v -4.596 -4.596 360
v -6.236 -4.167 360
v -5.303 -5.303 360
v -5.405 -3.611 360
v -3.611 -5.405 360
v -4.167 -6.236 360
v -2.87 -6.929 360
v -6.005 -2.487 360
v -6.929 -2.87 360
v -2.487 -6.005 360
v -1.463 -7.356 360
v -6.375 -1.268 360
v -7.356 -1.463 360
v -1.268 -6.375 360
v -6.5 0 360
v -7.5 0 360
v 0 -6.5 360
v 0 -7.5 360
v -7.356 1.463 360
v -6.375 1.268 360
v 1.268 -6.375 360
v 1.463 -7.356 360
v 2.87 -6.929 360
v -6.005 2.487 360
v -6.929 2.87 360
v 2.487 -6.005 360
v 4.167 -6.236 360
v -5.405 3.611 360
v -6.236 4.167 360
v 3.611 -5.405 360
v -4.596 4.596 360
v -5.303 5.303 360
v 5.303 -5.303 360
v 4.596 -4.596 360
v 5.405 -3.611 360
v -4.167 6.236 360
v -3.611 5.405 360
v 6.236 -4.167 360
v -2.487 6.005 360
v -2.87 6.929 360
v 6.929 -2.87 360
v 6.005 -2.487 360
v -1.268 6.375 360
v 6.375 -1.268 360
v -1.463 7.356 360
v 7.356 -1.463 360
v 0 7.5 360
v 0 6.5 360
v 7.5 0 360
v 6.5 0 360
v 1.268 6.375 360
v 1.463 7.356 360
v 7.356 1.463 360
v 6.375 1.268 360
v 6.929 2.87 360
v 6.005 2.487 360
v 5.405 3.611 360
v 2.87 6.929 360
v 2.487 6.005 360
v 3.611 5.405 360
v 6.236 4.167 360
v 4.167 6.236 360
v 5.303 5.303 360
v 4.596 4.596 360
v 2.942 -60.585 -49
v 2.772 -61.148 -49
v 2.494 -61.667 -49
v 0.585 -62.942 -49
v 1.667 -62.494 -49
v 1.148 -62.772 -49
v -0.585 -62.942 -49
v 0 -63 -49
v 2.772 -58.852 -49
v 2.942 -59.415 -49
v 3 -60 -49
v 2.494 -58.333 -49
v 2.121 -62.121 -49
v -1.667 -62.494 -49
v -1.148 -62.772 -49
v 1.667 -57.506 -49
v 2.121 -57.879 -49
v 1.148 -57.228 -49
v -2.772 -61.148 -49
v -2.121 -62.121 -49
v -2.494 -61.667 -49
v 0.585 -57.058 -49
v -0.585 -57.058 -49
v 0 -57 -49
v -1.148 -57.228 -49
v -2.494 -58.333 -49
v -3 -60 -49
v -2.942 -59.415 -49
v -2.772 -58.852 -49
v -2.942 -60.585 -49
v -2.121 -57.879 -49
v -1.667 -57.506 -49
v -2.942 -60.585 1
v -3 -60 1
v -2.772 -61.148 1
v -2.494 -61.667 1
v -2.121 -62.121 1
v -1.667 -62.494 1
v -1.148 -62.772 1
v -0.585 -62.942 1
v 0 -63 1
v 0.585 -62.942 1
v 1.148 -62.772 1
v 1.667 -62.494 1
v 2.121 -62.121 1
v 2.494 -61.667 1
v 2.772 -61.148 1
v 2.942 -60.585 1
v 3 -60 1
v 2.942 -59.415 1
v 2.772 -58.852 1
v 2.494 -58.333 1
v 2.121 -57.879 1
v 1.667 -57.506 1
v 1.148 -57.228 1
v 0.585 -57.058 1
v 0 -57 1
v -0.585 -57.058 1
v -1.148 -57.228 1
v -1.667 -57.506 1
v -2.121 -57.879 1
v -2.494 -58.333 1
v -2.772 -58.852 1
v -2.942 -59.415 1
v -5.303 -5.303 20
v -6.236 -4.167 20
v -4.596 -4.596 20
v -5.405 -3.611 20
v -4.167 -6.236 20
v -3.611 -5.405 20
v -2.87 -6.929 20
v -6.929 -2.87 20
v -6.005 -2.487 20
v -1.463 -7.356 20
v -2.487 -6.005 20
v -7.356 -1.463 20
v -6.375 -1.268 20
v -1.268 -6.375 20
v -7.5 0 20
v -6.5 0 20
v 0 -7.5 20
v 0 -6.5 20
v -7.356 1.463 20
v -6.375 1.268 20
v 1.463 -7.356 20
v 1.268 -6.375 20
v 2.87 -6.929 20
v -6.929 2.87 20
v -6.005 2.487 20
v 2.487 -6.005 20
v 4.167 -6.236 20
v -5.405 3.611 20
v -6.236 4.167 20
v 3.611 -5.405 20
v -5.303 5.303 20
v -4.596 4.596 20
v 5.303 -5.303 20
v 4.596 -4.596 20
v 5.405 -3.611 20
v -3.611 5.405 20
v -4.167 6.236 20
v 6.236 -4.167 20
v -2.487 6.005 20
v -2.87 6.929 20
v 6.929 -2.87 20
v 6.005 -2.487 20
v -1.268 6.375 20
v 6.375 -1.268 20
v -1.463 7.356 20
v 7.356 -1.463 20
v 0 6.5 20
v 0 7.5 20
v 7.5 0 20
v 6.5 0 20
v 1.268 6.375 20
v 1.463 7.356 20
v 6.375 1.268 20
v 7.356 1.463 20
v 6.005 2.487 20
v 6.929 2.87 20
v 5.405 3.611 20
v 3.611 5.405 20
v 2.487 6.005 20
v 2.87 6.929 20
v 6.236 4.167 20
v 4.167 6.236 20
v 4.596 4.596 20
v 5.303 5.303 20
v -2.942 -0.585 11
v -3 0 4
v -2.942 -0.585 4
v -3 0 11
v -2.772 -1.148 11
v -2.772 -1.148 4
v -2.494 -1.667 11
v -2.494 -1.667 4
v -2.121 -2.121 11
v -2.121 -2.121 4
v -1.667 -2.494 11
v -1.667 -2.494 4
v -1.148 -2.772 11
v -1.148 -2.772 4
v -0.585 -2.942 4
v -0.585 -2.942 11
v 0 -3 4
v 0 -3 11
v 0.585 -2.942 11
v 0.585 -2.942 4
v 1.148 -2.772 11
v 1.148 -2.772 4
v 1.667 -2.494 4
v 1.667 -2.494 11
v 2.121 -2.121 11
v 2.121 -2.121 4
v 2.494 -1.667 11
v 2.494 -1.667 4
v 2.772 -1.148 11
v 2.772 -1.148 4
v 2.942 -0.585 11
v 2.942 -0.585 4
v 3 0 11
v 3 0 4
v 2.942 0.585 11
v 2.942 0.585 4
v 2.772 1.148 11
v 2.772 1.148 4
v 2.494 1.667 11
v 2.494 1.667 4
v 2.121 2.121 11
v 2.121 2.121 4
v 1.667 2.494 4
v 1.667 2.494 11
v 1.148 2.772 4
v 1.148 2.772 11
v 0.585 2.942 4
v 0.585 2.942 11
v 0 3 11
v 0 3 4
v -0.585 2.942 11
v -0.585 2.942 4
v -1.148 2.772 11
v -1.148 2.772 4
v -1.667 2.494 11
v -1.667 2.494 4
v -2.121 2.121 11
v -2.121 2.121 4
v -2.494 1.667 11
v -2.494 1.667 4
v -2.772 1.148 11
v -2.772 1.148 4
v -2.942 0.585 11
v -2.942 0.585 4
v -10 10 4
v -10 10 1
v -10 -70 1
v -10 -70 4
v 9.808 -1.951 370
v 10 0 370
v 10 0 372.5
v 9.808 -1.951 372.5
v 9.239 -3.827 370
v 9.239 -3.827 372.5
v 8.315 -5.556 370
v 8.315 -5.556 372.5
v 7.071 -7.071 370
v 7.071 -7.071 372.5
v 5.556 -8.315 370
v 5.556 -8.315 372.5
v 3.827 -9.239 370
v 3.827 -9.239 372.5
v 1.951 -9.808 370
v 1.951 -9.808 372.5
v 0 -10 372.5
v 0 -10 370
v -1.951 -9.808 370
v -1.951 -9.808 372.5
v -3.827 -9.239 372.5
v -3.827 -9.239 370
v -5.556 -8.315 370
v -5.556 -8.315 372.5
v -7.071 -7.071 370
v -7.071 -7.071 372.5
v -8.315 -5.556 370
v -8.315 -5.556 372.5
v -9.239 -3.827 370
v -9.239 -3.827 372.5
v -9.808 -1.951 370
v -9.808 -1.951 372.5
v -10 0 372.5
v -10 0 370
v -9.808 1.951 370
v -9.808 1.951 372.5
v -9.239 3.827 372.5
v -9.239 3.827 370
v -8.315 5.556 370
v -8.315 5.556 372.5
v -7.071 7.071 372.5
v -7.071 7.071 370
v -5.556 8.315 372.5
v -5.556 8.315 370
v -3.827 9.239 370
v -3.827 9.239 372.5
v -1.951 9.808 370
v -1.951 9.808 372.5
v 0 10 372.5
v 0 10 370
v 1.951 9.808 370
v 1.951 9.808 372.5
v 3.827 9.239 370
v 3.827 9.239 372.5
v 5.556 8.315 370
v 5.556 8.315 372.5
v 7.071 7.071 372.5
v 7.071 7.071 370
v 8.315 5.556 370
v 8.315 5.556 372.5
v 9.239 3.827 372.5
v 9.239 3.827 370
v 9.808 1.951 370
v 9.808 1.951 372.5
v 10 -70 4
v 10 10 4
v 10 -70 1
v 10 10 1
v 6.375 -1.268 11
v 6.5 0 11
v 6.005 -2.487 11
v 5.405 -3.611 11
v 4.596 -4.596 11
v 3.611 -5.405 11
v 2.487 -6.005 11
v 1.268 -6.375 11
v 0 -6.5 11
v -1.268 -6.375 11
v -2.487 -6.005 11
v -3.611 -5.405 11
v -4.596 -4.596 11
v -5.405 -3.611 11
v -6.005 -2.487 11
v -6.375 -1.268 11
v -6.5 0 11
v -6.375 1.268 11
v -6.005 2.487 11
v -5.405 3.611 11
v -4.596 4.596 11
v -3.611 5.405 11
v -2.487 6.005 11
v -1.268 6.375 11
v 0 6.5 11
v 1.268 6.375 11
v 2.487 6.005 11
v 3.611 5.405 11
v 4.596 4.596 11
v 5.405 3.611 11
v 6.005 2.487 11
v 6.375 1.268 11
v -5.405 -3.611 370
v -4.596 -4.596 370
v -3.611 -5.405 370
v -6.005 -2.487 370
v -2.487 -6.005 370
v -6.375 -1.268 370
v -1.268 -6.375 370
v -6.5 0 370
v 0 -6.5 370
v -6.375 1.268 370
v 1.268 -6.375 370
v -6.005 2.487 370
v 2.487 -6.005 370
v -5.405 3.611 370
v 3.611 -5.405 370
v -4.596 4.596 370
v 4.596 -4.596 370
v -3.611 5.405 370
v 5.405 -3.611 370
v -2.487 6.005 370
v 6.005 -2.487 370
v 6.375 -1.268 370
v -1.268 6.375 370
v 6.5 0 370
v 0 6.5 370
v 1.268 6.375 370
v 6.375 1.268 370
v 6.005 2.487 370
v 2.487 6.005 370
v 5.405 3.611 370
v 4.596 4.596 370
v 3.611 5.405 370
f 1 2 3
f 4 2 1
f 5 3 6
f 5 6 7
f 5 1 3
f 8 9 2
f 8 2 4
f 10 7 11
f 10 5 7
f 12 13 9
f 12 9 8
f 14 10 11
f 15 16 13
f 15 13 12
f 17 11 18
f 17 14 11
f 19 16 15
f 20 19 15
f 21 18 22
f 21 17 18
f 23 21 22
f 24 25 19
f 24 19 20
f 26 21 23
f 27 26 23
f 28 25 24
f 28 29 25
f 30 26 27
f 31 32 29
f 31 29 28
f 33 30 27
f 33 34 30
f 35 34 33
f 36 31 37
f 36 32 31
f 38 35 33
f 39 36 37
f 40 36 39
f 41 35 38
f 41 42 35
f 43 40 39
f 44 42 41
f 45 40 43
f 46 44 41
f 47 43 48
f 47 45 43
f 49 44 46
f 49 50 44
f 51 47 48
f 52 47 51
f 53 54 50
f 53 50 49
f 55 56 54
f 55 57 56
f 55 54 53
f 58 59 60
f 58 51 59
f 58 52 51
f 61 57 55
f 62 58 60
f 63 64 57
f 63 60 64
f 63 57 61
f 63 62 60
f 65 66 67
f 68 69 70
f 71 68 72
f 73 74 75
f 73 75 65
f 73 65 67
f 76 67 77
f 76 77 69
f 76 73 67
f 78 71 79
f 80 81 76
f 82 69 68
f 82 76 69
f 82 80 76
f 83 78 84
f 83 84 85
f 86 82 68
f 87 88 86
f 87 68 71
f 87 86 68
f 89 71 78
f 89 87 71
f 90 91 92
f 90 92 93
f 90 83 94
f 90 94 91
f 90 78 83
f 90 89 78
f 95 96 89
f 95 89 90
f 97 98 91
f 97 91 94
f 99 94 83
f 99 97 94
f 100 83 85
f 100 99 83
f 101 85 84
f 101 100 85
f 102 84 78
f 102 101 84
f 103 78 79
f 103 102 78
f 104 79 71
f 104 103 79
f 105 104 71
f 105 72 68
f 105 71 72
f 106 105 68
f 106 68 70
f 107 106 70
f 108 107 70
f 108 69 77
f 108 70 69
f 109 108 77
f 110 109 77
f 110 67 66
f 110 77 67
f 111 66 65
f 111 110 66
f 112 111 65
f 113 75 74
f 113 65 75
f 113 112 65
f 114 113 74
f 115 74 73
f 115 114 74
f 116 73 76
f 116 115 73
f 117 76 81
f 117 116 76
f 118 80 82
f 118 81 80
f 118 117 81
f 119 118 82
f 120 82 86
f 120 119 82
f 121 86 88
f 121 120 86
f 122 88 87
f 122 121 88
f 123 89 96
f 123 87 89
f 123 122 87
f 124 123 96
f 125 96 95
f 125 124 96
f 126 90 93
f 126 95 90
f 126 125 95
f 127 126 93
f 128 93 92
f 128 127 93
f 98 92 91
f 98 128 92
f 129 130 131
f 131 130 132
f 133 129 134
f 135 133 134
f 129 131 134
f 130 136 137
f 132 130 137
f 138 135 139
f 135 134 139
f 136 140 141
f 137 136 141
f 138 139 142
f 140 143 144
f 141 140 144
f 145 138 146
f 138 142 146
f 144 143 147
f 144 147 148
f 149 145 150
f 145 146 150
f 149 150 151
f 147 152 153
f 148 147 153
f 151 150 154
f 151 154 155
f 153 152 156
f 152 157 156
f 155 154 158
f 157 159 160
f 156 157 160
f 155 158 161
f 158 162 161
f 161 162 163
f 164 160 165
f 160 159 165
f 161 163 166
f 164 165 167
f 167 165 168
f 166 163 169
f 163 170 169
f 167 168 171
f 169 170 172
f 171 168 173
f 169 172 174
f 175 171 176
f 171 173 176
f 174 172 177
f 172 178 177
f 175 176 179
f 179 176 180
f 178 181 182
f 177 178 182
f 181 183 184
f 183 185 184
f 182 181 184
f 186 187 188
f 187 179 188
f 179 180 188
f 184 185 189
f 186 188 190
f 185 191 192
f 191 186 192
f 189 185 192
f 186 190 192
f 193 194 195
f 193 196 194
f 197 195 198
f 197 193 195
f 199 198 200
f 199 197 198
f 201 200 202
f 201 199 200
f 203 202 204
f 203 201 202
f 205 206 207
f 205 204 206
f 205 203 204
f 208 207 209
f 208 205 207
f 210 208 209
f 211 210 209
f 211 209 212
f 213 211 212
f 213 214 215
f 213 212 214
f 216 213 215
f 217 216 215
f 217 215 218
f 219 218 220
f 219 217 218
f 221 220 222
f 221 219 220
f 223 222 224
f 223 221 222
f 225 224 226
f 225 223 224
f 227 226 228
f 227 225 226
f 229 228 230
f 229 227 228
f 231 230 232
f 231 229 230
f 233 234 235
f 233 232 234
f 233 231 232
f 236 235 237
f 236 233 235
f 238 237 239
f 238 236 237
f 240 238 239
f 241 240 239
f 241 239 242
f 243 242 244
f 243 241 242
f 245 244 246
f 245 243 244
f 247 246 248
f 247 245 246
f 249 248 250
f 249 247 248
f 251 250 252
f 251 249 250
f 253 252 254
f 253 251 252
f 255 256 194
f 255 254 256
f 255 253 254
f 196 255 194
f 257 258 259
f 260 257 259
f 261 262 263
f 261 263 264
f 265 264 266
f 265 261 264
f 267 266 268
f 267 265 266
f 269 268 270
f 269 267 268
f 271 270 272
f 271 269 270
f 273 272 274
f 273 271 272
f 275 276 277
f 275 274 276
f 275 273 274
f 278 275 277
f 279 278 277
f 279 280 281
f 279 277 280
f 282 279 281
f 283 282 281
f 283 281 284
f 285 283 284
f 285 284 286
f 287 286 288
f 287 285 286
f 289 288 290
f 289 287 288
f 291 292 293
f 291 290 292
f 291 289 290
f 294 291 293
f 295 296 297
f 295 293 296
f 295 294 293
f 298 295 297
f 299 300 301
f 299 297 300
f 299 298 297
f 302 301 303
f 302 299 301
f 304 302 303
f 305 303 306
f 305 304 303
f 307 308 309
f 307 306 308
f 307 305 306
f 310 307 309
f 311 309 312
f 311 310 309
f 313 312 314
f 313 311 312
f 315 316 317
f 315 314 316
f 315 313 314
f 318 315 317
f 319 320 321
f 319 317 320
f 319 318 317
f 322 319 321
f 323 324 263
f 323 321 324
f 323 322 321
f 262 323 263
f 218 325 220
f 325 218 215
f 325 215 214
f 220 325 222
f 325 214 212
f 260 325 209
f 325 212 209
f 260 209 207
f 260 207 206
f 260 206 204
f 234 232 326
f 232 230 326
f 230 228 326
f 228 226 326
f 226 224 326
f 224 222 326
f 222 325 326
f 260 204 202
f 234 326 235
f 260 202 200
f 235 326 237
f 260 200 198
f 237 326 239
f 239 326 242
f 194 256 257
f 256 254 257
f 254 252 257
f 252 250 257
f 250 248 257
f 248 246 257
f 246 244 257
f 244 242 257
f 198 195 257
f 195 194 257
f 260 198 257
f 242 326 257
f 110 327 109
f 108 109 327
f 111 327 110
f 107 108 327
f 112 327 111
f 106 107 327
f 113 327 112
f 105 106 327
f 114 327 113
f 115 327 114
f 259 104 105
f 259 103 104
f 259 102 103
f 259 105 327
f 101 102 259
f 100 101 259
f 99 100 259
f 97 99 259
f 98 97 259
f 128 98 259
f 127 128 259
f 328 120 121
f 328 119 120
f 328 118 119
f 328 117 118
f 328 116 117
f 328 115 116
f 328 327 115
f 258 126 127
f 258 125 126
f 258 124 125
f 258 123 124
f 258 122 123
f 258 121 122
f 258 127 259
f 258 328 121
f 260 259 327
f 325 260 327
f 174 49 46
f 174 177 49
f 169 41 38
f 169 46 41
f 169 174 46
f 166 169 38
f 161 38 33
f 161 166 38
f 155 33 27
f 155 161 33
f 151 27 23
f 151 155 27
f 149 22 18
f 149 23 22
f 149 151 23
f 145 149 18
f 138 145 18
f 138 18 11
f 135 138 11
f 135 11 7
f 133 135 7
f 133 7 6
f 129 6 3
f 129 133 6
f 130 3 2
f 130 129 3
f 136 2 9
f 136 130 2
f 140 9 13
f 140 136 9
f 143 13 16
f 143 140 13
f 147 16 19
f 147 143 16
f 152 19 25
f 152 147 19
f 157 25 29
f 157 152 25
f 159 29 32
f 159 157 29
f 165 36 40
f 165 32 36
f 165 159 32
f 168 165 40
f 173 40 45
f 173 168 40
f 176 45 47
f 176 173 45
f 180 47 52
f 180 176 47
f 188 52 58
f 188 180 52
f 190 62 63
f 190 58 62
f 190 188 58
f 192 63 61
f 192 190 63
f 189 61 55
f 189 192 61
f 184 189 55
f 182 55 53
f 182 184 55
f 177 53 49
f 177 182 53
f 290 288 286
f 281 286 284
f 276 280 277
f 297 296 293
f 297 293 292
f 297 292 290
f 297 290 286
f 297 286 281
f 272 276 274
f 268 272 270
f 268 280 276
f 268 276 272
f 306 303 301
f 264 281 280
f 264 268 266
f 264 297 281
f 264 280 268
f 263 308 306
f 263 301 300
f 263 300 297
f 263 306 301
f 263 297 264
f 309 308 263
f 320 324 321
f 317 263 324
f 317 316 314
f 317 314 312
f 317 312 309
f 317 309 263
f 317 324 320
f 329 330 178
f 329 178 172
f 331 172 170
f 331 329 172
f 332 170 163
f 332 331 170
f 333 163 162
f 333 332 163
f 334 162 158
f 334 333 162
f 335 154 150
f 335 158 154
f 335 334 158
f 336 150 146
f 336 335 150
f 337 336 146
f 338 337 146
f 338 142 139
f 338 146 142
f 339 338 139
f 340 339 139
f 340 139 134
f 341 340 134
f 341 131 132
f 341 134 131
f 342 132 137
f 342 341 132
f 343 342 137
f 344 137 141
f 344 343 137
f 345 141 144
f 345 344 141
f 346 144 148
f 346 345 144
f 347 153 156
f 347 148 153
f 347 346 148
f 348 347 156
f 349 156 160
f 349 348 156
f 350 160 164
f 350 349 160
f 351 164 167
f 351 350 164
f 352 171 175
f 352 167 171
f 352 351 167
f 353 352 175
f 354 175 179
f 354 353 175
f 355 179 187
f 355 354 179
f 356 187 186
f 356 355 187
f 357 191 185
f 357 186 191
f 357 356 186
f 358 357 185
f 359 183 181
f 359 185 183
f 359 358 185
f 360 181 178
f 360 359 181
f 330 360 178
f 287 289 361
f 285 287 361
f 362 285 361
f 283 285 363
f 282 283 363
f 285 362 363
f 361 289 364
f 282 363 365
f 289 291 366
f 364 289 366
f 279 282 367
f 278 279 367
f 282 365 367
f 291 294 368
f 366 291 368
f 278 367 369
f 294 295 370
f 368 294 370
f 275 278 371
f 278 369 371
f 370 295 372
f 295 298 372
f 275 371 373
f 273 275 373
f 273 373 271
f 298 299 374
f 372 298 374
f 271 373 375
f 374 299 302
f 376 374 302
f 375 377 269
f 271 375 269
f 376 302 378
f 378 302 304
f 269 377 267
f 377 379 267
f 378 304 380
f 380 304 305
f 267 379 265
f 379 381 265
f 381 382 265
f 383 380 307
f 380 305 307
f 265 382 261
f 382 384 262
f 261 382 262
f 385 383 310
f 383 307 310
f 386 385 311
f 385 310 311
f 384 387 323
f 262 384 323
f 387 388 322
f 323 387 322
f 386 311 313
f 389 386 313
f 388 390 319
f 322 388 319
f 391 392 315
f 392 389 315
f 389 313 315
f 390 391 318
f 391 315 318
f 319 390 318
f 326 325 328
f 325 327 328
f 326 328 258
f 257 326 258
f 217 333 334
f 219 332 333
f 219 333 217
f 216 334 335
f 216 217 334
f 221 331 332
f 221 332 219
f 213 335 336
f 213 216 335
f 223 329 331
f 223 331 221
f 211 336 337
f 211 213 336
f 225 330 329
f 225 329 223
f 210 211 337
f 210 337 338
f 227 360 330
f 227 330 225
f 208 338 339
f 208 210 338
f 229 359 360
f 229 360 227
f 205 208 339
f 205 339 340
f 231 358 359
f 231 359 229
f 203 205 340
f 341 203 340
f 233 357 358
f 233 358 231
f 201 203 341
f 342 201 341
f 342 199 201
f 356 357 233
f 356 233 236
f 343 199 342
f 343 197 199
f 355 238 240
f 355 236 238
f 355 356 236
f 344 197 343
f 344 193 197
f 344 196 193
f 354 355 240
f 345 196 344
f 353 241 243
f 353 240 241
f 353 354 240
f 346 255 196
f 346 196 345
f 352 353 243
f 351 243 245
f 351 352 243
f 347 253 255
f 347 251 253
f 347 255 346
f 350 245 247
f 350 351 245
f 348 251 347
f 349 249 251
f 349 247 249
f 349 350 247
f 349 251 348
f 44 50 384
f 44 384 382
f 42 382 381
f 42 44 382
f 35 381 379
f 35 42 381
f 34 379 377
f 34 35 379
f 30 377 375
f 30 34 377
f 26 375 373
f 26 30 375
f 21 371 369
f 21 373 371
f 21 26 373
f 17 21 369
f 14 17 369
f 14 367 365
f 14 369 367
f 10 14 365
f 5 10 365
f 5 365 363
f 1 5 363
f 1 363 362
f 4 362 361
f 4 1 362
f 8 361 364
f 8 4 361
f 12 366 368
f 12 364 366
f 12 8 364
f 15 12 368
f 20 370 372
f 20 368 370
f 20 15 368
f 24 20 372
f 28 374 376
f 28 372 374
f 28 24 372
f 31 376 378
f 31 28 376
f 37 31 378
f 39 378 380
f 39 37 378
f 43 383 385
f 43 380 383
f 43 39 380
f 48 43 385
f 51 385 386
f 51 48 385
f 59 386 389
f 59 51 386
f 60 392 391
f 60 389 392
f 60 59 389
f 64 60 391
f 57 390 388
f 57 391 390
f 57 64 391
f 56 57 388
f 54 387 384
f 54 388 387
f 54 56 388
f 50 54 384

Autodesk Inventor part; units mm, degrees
ref_plane "YZ Plane" through (0, 0, 0) normal (1, 0, 0) x (0, 1, 0)
ref_plane "XZ Plane" through (0, 0, 0) normal (0, 1, 0) x (-1, 0, 0)
ref_plane "XY Plane" through (0, 0, 0) normal (0, 0, 1) x (1, 0, 0)
sketch "Sketch1" plane through (0, 0, 0) normal (0, 0, 1) x (1, 0, 0)
  circle A0 centre (0, 0) radius 25
  dimension "d0" = 50
extrude "Extrusion1" add sketch "Sketch1" along normal blind 10
sketch "Sketch2" plane through (0, 0, 10) normal (0, 0, 1) x (1, 0, 0)
  circle A0 centre (0, 0) radius 6.5
  dimension "d3" = 13
extrude "Extrusion2" add sketch "Sketch2" along normal blind 10
fillet "Fillet1" radius 1 1 edges at (-6.5, 0, 10)
sketch "Sketch4" plane through (0, 0, 0) normal (0, 0, -1) x (-1, 0, 0)
  arc A0 (19.3649, 5) -> (5, 19.3649) centre (0, 0) ccw
  line L0 (2.5, 17.4284) -> (2.5, 9.4868)
  line L1 (9.4868, 2.5) -> (17.4284, 2.5)
  arc A1 (5, 19.3649) -> (2.5, 17.4284) centre (4.5, 17.4284) ccw
  arc A2 (17.4284, 2.5) -> (19.3649, 5) centre (17.4284, 4.5) ccw
  arc A3 (2.5, 8.3666) -> (2.5153, 8.1193) centre (4.5, 8.3666) ccw
  arc A4 (8.1193, 2.5153) -> (8.3666, 2.5) centre (8.3666, 4.5) ccw
  arc A5 (7.6798, 3.6429) -> (3.6429, 7.6798) centre (0, 0) ccw
  arc A6 (2.5, 9.4868) -> (3.6429, 7.6798) centre (4.5, 9.4868) ccw
  arc A7 (7.6798, 3.6429) -> (9.4868, 2.5) centre (9.4868, 4.5) ccw
  point P0 (2.5, 19.8431)
  point P1 (19.8431, 2.5)
  point P2 (2.5, 7.0711)
  point P3 (7.0711, 2.5)
extrude "Extrusion3" cut sketch "Sketch4" against normal blind 10
pattern_circular "Circular Pattern1" count 4 over 360 about axis through (0, 0, 11) along (0, 0, -1) of "Extrusion3"
sketch "Sketch7" plane through (0, 0, 20) normal (0, 0, 1) x (1, 0, 0)
  circle A0 centre (0, 0) radius 7.5
  dimension "d38" = 15
extrude "Extrusion5" add sketch "Sketch7" along normal blind 340
sketch "Sketch8" plane through (0, 0, 360) normal (0, 0, 1) x (1, 0, 0)
  circle A0 centre (0, 0) radius 6.5
  dimension "d41" = 13
extrude "Extrusion6" add sketch "Sketch8" along normal blind 10
sketch "Sketch9" plane through (0, 0, 370) normal (0, 0, 1) x (1, 0, 0)
  circle A0 centre (0, 0) radius 10
  dimension "d44" = 20
extrude "Extrusion7" add sketch "Sketch9" along normal blind 2.5
thread "Thread1" size "M15x1.5" class "6g" standard "ANSI Metric M Profile" length 340
sketch "Sketch10" plane through (0, 0, 0) normal (0, 0, -1) x (-1, 0, 0)
  circle A0 centre (0, 0) radius 25
extrude "Extrusion8" cut sketch "Sketch10" against normal blind 11
sketch "Sketch11" plane through (0, 0, 11) normal (0, 0, -1) x (-1, 0, 0)
  circle A0 centre (0, 0) radius 3
  dimension "d51" = 6
extrude "Extrusion9" add sketch "Sketch11" along normal blind 10
sketch "Sketch12" plane through (0, 0, 1) normal (0, 0, -1) x (-1, 0, 0)
  circle A0 centre (0, 0) radius 3 projected
  circle A1 centre (0, 0) radius 3
  line L0 (-10, 10) -> (10, 10)
  line L1 (10, 10) -> (10, -70)
  line L2 (10, -70) -> (-10, -70)
  line L3 (-10, -70) -> (-10, 10)
  dimension "d54" = 20
  dimension "d55" = 80
extrude "Extrusion10" add sketch "Sketch12" against normal blind 3
sketch "Sketch13" plane through (0, 0, 1) normal (0, 0, -1) x (-1, 0, 0)
  line L0 (10, -70) -> (-10, -70) projected
  circle A0 centre (0, -60) radius 3
  point P0 (0, 0)
  dimension "d59" = 6
extrude "Extrusion11" add sketch "Sketch13" along normal blind 50
properties part number "leadscrew_modified" material "Steel, Alloy"
